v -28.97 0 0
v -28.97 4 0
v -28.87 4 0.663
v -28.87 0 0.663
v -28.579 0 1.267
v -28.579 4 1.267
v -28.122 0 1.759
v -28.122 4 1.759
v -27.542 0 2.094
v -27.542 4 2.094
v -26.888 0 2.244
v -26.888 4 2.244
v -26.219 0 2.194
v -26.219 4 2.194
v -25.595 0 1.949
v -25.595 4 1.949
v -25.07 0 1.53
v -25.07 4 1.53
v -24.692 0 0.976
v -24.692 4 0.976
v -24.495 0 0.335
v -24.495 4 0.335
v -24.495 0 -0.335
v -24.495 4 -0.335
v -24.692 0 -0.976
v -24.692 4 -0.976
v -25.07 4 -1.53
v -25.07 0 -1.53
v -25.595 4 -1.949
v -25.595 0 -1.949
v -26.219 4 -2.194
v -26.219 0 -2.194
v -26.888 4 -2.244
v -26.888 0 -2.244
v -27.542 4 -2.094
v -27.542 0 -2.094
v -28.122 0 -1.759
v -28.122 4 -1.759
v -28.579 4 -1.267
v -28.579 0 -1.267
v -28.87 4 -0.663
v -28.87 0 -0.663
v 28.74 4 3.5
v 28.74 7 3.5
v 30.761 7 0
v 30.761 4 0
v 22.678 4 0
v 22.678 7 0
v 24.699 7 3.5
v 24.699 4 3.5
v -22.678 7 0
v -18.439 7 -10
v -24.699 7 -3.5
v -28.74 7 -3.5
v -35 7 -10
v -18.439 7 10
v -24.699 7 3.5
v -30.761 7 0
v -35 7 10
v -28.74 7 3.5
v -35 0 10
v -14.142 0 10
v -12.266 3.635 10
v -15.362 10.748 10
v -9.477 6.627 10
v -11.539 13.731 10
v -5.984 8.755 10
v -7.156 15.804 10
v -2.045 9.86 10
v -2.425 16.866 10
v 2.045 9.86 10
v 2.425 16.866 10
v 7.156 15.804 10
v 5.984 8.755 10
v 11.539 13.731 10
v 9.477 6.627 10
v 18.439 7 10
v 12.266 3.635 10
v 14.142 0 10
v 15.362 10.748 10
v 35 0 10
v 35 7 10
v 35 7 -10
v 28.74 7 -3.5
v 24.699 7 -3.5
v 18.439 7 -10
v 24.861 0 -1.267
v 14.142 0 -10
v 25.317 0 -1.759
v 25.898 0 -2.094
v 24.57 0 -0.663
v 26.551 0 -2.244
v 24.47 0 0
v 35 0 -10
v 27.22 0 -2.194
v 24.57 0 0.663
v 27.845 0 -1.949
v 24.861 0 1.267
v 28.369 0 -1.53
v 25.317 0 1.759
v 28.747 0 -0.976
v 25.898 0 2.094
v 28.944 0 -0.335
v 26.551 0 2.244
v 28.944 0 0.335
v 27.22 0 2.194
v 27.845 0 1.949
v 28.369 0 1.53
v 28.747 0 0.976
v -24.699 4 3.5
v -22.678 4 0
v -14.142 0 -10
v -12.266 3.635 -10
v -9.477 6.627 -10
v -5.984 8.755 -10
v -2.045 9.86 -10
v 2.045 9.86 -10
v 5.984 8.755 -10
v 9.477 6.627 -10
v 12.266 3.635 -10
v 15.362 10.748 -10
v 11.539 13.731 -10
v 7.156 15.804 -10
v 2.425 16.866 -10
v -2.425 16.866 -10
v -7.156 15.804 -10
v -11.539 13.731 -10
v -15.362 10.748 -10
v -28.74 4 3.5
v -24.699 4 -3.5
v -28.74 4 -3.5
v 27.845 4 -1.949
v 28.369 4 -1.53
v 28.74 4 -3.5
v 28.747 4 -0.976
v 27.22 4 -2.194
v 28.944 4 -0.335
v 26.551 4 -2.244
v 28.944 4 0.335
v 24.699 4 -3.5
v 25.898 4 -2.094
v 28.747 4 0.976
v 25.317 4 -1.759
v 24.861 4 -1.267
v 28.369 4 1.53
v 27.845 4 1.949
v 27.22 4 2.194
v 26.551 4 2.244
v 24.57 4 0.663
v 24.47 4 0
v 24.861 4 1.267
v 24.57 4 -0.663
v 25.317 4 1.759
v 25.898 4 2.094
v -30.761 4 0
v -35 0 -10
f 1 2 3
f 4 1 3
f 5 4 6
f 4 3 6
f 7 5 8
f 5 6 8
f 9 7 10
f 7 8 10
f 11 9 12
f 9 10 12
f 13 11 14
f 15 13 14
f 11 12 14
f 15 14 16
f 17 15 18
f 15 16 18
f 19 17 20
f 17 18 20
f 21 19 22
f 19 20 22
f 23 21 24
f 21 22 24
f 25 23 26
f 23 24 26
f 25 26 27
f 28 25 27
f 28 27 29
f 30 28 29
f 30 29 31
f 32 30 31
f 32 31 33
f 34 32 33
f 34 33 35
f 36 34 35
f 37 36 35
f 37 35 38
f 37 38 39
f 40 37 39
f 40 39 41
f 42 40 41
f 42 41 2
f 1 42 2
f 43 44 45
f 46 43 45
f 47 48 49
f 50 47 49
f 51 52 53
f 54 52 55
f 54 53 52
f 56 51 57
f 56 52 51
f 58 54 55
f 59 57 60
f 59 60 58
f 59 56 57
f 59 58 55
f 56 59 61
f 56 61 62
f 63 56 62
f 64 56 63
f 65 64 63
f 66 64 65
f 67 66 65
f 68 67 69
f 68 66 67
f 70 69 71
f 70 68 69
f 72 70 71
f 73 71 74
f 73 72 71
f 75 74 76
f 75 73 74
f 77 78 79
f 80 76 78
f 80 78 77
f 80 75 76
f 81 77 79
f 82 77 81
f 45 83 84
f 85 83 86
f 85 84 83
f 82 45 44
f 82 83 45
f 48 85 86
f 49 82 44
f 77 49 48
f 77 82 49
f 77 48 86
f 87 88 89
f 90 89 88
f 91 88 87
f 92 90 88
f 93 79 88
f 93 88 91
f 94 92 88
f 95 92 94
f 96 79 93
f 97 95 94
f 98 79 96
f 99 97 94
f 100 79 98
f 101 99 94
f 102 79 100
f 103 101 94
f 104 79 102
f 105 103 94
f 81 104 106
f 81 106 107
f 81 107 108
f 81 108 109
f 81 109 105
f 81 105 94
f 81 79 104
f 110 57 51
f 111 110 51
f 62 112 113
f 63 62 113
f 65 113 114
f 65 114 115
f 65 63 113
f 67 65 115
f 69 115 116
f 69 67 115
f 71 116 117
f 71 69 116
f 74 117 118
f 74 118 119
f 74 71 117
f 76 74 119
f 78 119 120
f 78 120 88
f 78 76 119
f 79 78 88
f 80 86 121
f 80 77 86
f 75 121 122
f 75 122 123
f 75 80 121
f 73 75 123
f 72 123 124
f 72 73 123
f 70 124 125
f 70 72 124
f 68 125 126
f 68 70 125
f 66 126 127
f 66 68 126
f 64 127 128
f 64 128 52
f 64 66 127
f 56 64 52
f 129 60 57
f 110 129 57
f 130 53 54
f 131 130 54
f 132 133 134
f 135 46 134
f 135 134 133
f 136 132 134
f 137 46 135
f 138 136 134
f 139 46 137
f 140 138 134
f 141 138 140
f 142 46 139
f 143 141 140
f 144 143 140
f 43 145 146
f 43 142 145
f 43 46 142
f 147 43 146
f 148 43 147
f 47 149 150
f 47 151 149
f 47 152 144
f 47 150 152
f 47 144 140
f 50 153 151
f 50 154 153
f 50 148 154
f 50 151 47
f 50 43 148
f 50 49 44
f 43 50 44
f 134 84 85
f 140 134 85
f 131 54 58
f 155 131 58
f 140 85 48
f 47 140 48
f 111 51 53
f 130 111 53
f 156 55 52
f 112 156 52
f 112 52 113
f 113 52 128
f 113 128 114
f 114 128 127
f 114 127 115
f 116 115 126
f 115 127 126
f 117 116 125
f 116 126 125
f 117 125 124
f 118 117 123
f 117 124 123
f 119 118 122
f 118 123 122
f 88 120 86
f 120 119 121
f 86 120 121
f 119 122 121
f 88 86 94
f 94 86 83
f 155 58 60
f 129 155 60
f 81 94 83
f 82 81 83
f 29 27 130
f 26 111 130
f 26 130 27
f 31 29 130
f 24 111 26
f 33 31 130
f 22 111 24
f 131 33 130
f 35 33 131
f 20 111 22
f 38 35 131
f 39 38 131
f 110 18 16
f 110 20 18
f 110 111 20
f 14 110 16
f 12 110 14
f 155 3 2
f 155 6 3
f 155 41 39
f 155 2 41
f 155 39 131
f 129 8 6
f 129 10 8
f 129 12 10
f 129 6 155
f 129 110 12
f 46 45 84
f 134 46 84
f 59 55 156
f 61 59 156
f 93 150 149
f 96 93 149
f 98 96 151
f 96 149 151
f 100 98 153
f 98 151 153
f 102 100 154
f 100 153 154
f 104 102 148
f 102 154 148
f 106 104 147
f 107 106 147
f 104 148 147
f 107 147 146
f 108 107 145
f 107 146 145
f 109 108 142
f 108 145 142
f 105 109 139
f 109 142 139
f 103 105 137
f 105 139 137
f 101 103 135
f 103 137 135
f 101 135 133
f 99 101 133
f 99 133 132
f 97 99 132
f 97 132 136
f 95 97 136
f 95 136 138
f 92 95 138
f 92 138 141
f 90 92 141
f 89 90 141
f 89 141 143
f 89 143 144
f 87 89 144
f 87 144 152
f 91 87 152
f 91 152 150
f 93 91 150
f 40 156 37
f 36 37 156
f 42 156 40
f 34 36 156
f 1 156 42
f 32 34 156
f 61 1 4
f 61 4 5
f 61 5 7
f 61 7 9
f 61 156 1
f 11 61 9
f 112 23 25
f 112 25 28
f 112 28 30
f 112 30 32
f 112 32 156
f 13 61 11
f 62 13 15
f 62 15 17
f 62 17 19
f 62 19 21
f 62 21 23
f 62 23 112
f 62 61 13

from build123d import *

# Parameters (mm, degrees)
F1_DEPTH = 10
F2_R     = 2.25
F3_DEPTH = 25
F4_R     = 2.25
F5_DEPTH = 3


with BuildPart() as f1:
    # F0 (on Top) → F1 (new body, symmetric)
    with BuildSketch(Plane.XY):
        with BuildLine():
            Line((-35, 7), (-35, 0))
            Line((-35, 0), (-14.142136, 0))
            ThreePointArc((-14.142136, 0), (0, 10), (14.142136, 0))
            Line((14.142136, 0), (35, 0))
            Line((35, 0), (35, 7))
            Line((35, 7), (18.439089, 7))
            ThreePointArc((18.439089, 7), (0, 17), (-18.439089, 7))
            Line((-18.439089, 7), (-35, 7))
        make_face()
    extrude(amount=F1_DEPTH, both=True)

    # F2 (on face) → F3 (cut)
    with BuildSketch(Plane(origin=(0, 7, 0), x_dir=(-1, 0, 0), z_dir=(0, 1, 0))):
        with Locations((-26.719544, 0)):
            Circle(F2_R)
        with Locations((26.719544, 0)):
            Circle(F2_R)
    extrude(amount=-F3_DEPTH, mode=Mode.SUBTRACT)

    # F4 (on face) → F5 (cut)
    with BuildSketch(Plane(origin=(0, 7, 0), x_dir=(-1, 0, 0), z_dir=(0, 1, 0))):
        Polygon((-28.74027, 3.5), (-30.760996, 0), (-28.74027, -3.5), (-24.698819, -3.5), (-22.678093, 0), (-24.698819, 3.5), align=None)
        with Locations((-26.719544, 0)):
            Circle(F4_R, mode=Mode.SUBTRACT)
        Polygon((28.74027, -3.5), (30.760996, 0), (28.74027, 3.5), (24.698819, 3.5), (22.678093, 0), (24.698819, -3.5), align=None)
    extrude(amount=-F5_DEPTH, mode=Mode.SUBTRACT)


solid = f1.part
